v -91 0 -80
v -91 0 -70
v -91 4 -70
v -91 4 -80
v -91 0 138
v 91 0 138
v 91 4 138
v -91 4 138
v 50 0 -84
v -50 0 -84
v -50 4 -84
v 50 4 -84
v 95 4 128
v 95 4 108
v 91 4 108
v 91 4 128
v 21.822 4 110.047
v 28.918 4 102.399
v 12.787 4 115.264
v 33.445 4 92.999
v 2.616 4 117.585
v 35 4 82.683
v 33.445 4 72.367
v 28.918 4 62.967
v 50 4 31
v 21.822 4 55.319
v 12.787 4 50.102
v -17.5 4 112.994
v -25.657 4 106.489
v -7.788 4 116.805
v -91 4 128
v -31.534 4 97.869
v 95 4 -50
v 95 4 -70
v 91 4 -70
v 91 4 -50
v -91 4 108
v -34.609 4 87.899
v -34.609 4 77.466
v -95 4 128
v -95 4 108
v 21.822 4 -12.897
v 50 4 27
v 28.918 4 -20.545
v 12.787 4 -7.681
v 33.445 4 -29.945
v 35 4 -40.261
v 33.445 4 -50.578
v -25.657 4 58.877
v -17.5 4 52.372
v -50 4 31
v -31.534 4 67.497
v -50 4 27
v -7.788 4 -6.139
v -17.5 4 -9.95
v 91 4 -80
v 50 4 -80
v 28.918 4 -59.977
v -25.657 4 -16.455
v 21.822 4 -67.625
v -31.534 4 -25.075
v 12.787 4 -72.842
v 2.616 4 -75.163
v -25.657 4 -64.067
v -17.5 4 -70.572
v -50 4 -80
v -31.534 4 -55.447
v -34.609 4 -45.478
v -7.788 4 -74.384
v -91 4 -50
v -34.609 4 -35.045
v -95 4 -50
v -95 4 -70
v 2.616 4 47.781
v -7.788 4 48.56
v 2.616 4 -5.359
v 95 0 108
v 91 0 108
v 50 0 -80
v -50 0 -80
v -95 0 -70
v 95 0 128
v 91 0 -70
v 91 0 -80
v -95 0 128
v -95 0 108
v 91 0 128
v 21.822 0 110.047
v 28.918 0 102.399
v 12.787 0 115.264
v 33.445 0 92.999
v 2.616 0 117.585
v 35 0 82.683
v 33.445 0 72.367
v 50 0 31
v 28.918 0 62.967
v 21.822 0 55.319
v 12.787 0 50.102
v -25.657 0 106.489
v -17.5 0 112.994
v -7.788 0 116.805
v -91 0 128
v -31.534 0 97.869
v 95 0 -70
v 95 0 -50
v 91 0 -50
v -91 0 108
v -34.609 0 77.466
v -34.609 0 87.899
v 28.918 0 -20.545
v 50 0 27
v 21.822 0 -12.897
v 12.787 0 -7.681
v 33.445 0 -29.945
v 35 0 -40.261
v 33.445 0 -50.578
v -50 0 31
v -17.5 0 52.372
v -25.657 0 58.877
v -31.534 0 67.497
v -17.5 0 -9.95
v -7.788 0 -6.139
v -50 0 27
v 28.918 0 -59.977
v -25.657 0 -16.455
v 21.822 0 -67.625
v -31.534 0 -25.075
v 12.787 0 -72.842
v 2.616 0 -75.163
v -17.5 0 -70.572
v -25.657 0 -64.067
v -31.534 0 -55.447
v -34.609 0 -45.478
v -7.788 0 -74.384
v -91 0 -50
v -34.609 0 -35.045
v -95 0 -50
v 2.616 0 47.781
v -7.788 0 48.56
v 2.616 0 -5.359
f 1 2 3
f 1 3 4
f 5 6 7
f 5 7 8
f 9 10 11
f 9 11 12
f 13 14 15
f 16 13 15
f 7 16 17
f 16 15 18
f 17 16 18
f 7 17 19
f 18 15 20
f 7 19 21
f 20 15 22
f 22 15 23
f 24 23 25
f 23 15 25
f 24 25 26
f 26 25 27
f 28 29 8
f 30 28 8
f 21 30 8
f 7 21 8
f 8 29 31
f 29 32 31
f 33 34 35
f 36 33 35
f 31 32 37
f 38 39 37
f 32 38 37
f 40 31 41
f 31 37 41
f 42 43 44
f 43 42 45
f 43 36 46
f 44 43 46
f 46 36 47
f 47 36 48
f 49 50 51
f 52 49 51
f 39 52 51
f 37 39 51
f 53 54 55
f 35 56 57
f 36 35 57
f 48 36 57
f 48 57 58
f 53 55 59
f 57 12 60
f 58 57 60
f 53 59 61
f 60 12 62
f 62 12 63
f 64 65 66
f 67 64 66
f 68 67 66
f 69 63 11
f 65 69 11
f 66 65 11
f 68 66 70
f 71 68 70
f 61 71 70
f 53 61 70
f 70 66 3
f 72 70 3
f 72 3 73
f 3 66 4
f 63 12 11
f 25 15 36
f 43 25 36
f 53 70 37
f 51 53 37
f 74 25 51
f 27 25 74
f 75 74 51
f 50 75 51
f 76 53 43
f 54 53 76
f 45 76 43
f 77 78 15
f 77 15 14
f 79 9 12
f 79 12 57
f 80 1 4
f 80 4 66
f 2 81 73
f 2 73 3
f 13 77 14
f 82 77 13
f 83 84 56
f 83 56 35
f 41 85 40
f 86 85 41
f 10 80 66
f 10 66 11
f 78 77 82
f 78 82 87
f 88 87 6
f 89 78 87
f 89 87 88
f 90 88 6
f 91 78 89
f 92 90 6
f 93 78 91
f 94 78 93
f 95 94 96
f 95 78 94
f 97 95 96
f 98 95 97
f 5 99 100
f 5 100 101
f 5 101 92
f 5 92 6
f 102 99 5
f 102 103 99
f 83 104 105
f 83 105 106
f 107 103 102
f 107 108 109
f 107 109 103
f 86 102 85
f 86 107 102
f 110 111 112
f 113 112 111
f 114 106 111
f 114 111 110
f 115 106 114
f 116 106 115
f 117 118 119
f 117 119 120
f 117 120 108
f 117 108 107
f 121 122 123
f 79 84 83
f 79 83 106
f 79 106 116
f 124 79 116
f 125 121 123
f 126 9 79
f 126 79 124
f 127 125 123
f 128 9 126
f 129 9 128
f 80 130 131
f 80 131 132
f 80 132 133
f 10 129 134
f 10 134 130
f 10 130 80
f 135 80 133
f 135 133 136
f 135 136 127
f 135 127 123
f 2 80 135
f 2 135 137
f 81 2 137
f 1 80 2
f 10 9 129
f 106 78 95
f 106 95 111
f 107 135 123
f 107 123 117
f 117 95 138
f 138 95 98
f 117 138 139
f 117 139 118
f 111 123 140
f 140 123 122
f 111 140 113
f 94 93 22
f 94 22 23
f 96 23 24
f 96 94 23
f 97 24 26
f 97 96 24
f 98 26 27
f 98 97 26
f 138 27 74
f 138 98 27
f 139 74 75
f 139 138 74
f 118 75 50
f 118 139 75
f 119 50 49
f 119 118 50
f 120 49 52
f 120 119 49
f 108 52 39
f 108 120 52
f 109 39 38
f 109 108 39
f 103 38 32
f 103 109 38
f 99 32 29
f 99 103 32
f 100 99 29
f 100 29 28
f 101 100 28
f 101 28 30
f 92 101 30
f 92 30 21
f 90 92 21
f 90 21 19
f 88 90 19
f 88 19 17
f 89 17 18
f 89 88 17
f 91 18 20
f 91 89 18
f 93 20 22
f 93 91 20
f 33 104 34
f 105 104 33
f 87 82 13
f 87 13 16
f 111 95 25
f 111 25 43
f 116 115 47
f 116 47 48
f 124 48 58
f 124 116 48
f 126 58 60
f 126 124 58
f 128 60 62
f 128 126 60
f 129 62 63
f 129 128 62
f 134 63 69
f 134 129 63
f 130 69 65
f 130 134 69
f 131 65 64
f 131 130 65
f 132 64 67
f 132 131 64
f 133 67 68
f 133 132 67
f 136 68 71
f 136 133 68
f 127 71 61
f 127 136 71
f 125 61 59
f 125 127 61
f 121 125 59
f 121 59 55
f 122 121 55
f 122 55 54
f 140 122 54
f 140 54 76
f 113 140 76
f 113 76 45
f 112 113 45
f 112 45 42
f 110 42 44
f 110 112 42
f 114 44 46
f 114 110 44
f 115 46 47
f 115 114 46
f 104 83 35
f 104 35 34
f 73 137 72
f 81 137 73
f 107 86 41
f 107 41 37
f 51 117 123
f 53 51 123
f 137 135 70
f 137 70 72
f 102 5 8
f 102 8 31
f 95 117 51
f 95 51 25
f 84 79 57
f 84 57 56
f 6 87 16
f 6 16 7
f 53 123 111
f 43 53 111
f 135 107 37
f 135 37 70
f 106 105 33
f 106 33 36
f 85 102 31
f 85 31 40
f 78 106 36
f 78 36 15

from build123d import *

# Parameters (mm, degrees)
SKETCH2_R           = 35
SKETCH2_W           = 100
SKETCH2_H           = 4
BOSS_EXTRUDE1_DEPTH = 4


with BuildPart() as part:
    # Sketch2 → Boss-Extrude1 (new body)
    with BuildSketch(Plane(origin=(0, 0, 0), x_dir=(1, 0, 0), z_dir=(0, 1, 0))):
        Polygon((-50, 84), (50, 84), (50, 80), (91, 80), (91, 70), (95, 70), (95, 50), (91, 50), (91, -108), (95, -108), (95, -128), (91, -128), (91, -138), (-91, -138), (-91, -128), (-95, -128), (-95, -108), (-91, -108), (-91, 50), (-95, 50), (-95, 70), (-91, 70), (-91, 80), (-50, 80), align=None)
        with Locations((0, 40.261243559)):
            Circle(SKETCH2_R, mode=Mode.SUBTRACT)
        with Locations((0, -82.68297303)):
            Circle(SKETCH2_R, mode=Mode.SUBTRACT)
        with Locations((0, -29)):
            Rectangle(SKETCH2_W, SKETCH2_H, mode=Mode.SUBTRACT)
    extrude(amount=BOSS_EXTRUDE1_DEPTH)


solid = part.part
